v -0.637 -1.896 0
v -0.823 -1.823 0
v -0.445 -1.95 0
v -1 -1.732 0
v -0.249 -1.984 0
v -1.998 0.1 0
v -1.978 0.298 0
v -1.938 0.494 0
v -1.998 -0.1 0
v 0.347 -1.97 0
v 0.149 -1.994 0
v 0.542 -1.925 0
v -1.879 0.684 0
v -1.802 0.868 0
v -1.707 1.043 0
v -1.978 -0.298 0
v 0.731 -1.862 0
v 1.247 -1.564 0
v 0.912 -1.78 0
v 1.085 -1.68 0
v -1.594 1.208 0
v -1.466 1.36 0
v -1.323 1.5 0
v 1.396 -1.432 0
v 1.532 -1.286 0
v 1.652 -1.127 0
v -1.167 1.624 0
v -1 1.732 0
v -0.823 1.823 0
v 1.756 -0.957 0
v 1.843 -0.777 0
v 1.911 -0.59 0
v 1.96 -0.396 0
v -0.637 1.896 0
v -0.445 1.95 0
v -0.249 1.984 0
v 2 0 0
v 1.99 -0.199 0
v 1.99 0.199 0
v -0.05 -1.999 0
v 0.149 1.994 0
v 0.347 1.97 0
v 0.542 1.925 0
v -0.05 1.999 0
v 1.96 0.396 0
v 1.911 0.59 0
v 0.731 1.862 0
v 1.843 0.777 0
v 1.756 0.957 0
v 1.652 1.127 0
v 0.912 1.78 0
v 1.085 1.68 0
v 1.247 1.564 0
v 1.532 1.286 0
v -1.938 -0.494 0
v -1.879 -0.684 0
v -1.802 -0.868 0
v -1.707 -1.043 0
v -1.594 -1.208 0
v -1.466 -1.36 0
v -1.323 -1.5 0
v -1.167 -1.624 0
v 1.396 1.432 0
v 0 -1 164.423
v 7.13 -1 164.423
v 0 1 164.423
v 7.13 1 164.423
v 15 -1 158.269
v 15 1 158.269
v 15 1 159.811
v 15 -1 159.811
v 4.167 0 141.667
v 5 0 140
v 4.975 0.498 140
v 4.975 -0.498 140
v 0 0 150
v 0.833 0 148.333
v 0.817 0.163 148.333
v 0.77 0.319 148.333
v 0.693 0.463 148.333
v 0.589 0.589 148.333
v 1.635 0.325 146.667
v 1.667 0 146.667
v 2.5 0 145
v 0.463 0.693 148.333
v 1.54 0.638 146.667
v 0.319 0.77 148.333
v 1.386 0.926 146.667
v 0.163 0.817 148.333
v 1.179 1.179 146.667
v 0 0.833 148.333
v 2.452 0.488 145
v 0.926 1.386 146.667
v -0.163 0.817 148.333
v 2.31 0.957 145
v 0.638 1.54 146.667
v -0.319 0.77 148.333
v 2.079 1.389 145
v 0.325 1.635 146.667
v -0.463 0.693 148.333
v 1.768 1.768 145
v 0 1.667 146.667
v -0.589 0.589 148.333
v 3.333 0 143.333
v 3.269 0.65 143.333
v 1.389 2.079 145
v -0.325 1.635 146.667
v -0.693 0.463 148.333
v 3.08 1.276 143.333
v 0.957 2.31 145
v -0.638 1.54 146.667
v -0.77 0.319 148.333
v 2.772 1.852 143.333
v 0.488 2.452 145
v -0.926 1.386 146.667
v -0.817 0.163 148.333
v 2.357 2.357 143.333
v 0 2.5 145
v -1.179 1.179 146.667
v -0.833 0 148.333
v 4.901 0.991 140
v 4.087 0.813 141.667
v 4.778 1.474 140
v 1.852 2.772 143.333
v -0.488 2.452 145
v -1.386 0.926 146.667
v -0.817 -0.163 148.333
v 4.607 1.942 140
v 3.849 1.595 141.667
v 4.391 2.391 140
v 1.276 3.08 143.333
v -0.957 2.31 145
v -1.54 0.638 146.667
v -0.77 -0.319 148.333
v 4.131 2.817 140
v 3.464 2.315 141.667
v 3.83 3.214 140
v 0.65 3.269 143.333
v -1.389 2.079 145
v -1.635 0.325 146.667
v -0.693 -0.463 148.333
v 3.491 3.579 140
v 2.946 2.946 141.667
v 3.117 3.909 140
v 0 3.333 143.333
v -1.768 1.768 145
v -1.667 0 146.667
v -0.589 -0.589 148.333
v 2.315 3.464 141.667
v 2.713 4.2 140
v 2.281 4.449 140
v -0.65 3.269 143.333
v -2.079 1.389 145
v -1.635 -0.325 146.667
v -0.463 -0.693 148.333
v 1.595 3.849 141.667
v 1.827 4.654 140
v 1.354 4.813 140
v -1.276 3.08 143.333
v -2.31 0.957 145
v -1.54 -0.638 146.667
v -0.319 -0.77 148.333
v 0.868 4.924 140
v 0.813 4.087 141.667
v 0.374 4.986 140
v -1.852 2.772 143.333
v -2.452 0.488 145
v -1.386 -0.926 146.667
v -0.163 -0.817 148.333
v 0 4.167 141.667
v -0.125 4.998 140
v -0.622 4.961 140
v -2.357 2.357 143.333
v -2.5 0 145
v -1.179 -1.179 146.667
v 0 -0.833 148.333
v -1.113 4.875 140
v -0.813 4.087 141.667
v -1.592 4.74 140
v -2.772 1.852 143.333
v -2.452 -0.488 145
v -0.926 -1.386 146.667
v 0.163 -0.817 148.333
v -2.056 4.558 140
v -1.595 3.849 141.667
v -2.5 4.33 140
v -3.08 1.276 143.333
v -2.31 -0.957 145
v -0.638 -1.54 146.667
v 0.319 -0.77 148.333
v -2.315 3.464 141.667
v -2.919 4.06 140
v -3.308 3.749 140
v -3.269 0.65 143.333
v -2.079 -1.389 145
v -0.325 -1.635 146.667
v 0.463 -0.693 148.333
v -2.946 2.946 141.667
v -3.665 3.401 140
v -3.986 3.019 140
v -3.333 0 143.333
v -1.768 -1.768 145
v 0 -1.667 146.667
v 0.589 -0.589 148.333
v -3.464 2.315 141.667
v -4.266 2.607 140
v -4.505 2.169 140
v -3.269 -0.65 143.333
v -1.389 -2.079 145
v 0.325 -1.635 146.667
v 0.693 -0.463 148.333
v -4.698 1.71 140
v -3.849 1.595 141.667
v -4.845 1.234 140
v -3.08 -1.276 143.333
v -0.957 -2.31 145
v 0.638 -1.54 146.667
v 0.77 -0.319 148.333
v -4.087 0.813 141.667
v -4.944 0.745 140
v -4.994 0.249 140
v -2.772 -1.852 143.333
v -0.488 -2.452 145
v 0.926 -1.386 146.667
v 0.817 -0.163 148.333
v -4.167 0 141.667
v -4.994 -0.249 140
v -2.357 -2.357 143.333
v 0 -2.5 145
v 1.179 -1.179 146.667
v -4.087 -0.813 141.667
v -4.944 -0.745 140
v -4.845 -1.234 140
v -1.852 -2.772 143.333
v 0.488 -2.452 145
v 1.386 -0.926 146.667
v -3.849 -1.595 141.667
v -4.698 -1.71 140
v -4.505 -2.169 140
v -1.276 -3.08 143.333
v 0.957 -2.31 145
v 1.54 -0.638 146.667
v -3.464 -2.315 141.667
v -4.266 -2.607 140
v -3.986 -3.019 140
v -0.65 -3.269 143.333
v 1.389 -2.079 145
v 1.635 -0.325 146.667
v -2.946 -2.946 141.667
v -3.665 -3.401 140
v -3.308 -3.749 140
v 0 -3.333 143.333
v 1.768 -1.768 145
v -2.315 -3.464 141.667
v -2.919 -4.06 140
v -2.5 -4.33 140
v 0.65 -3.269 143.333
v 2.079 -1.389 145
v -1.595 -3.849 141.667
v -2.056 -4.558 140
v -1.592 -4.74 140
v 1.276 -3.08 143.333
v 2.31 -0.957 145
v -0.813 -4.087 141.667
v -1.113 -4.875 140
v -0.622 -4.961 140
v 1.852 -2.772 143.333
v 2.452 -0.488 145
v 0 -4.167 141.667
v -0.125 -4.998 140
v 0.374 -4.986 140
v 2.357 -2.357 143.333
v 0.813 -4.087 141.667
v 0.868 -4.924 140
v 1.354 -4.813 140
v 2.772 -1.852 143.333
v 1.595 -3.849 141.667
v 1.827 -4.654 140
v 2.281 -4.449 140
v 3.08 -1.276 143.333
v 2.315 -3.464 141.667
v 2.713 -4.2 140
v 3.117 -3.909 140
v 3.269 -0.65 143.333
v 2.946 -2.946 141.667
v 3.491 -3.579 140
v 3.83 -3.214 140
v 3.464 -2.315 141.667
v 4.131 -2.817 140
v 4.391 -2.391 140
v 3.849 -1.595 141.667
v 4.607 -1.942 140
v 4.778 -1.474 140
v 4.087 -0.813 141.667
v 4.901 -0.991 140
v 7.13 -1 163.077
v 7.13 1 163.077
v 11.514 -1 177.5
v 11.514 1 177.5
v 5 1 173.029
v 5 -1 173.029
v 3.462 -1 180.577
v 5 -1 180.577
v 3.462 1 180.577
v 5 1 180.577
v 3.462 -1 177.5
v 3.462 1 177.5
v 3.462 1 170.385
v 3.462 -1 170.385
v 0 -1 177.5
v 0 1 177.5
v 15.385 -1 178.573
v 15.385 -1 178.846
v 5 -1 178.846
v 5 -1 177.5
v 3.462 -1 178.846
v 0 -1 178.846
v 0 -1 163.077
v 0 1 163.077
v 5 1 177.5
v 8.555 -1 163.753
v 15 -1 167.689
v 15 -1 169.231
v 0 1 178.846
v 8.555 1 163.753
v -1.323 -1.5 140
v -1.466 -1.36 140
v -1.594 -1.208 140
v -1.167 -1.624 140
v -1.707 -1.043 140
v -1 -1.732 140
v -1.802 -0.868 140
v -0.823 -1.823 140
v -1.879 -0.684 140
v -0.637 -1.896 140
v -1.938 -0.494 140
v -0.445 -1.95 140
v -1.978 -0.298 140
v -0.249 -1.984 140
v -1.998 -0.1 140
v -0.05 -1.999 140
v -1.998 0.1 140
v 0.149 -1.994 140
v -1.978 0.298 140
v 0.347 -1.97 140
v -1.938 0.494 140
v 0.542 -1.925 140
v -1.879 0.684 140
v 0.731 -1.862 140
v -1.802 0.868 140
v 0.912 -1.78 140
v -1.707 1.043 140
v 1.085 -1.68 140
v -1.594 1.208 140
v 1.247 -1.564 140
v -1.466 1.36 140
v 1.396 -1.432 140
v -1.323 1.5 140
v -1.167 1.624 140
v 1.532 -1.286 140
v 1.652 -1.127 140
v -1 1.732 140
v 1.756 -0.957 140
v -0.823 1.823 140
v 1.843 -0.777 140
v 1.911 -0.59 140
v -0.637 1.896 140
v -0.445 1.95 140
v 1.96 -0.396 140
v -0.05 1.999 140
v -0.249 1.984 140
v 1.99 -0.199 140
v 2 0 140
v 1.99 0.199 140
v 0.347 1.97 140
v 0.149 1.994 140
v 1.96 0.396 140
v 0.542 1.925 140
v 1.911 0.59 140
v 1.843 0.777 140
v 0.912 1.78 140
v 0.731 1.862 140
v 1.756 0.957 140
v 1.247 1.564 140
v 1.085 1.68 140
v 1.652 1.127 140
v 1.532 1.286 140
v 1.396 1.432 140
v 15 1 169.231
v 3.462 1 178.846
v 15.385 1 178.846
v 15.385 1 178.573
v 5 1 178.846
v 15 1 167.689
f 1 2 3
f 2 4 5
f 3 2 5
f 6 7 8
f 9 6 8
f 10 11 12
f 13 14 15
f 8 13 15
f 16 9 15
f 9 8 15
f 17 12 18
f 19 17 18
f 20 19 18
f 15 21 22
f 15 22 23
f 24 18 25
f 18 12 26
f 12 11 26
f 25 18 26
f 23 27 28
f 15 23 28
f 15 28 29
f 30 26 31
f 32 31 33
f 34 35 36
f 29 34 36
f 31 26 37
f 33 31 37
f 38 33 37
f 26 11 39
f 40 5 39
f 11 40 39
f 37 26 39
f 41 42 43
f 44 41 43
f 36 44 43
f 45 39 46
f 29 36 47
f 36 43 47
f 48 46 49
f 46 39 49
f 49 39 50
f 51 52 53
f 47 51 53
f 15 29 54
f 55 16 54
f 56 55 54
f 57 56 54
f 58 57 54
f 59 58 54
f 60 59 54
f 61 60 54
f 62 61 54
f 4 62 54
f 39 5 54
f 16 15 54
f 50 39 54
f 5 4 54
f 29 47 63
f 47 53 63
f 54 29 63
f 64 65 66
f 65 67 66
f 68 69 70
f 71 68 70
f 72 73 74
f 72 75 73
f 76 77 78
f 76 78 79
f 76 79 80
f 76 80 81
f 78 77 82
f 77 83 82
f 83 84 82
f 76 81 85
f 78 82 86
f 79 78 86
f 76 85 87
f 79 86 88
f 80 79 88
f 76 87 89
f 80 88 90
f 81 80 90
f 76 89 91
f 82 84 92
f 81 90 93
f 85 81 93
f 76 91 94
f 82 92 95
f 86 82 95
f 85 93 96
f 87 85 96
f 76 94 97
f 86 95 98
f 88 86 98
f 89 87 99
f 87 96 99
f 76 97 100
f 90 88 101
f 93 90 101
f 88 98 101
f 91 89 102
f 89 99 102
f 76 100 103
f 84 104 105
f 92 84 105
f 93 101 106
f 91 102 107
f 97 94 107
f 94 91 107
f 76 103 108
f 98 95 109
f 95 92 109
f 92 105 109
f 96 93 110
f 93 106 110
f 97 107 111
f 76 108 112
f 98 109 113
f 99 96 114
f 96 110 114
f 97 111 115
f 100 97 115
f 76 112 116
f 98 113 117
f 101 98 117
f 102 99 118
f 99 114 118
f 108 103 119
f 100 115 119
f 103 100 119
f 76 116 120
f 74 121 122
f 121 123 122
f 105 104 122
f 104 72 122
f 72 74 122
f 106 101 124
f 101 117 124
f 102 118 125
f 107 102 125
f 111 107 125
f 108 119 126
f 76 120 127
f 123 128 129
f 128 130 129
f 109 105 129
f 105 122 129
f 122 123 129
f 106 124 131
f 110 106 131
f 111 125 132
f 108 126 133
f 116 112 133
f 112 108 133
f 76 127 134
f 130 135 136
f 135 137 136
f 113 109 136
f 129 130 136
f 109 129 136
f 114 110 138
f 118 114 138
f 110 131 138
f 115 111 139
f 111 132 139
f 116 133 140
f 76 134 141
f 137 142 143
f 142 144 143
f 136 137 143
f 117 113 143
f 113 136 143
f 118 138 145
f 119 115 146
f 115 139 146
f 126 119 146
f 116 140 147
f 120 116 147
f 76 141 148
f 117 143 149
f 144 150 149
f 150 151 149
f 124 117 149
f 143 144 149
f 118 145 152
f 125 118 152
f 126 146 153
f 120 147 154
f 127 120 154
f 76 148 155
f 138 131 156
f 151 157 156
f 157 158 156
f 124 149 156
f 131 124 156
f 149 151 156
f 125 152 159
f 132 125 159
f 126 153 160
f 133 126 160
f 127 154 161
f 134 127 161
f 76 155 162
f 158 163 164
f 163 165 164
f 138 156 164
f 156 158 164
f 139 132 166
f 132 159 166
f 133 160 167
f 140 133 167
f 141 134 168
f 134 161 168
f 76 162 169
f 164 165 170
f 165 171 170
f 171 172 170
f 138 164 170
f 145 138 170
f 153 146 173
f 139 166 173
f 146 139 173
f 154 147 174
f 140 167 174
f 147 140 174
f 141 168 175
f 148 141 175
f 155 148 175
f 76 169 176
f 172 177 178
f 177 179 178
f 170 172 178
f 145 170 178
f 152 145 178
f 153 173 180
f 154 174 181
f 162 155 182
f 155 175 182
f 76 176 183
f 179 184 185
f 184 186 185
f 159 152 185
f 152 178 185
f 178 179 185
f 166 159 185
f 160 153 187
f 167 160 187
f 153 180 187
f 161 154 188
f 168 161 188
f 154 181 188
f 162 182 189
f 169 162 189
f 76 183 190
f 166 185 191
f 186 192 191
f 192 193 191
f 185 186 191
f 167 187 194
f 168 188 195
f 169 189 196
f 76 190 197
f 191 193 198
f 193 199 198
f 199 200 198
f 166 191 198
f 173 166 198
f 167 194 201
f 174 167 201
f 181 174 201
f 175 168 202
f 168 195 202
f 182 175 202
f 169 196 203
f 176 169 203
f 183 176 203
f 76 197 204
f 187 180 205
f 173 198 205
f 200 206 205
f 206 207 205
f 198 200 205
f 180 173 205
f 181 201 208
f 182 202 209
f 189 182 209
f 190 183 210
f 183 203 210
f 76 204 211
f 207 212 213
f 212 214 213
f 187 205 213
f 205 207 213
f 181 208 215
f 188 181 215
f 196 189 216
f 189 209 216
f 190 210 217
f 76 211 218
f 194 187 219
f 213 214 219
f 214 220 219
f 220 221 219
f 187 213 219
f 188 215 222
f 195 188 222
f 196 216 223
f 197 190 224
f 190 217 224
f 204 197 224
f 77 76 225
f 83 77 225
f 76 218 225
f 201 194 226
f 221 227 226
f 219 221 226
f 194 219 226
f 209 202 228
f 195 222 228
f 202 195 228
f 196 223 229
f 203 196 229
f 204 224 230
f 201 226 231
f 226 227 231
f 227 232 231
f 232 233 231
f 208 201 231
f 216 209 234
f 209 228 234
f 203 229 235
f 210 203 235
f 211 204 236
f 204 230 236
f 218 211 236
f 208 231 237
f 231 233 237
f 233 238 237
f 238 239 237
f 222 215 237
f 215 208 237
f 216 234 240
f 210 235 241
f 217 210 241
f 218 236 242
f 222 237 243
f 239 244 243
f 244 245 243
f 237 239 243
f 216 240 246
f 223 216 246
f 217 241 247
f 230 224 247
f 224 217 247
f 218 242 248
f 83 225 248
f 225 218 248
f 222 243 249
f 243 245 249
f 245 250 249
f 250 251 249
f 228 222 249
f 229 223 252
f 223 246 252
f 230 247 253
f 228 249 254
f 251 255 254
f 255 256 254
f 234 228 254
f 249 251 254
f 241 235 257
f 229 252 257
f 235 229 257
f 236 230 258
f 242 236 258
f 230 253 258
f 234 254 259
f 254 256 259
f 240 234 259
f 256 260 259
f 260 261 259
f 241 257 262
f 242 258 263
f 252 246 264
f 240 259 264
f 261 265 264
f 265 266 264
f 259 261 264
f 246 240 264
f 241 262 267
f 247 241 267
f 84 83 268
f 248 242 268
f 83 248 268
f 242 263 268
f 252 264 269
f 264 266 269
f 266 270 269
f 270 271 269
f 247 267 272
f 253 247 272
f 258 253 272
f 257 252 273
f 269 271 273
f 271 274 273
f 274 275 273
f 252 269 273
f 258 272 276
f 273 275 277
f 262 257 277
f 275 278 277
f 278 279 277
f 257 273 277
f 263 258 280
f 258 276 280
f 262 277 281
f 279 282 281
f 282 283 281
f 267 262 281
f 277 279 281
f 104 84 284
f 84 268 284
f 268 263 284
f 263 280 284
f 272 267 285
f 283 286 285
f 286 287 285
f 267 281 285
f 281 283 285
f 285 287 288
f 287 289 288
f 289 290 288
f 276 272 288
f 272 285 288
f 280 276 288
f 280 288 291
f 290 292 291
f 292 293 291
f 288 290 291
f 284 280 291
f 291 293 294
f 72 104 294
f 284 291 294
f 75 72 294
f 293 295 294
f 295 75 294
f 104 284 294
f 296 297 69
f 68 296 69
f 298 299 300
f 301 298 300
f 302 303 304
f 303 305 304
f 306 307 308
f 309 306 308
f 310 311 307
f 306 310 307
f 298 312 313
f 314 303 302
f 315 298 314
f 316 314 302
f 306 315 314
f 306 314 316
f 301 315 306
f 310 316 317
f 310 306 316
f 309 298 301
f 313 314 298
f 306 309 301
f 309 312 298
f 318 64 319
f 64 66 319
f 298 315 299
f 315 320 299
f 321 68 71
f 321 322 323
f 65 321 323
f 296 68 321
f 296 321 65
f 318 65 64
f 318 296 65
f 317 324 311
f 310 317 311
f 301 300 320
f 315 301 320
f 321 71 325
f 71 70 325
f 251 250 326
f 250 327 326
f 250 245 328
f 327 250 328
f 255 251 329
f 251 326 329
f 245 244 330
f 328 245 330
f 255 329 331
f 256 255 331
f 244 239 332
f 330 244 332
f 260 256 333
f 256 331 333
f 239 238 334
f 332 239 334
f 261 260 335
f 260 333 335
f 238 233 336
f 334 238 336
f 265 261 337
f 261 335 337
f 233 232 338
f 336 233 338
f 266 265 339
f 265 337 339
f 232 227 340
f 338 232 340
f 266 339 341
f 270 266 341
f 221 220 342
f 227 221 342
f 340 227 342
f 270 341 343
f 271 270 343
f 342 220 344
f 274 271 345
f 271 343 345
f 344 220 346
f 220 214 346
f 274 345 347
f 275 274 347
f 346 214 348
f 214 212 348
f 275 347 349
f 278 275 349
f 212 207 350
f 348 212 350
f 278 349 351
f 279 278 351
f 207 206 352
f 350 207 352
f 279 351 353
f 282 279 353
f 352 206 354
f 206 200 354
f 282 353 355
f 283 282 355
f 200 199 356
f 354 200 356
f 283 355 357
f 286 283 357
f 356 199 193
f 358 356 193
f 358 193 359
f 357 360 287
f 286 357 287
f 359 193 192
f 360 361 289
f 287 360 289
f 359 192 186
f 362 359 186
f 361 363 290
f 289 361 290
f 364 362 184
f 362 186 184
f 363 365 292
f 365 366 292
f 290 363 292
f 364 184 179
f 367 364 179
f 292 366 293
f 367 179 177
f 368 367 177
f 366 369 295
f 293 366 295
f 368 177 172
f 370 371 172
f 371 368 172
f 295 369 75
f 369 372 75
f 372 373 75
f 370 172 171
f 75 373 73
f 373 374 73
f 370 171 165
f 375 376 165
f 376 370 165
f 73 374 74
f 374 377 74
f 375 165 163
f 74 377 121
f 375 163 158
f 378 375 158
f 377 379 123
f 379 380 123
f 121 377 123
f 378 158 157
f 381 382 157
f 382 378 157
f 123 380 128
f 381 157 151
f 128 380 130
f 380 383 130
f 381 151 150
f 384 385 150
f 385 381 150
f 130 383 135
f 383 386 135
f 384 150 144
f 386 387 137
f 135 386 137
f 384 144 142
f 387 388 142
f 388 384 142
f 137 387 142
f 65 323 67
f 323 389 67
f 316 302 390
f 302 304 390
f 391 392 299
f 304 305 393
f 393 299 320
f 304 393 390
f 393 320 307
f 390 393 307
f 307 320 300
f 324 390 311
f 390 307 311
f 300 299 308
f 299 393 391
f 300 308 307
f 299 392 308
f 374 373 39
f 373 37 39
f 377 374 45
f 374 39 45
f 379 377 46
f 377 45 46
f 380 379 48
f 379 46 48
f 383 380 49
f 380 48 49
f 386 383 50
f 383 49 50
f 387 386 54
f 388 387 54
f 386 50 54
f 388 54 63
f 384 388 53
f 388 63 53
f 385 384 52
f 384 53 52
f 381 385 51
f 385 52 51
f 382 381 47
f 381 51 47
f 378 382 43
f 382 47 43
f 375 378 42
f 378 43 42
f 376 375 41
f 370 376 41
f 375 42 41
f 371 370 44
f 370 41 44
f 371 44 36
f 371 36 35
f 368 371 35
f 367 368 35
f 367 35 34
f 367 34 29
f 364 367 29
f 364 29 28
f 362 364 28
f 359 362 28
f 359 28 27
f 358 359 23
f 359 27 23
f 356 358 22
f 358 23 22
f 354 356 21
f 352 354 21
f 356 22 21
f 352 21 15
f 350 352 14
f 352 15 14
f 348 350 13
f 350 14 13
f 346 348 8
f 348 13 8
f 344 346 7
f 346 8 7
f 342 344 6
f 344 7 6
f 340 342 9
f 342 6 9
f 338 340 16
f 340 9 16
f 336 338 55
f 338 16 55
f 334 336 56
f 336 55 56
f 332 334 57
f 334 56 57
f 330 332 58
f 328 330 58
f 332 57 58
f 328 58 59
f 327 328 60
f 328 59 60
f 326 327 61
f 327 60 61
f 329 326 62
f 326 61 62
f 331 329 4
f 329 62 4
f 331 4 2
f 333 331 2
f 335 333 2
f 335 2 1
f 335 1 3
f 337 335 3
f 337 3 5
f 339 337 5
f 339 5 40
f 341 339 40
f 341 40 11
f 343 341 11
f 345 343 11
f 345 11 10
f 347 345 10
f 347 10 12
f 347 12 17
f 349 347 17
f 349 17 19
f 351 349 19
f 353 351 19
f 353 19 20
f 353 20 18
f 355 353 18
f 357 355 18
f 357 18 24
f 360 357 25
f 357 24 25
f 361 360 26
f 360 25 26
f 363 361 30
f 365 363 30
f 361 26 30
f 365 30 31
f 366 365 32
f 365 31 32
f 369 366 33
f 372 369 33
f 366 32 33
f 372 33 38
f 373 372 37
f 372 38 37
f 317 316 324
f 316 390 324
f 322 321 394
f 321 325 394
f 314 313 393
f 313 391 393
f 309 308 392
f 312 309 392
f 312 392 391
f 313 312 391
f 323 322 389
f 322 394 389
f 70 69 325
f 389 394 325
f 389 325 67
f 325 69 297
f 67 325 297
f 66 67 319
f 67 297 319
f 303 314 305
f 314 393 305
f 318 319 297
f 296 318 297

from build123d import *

# Parameters (mm, degrees)
BOSS_EXTRUDE1_DEPTH        = 1
BOSS_EXTRUDE1_DEPTH_BACK   = 1
BOSS_EXTRUDE1_2_DEPTH      = 1
BOSS_EXTRUDE1_2_DEPTH_BACK = 1


with BuildPart() as part:
    # Sketch2 → Revolve1 (revolve)
    with BuildSketch(Plane(origin=(0, 0, 0), x_dir=(1, 0, 0), z_dir=(0, 1, 0))):
        Polygon((0, -150), (5, -140), (2, -140), (2, 0), (0, 0), align=None)
    revolve(axis=Axis((0, 0, -41.949952025), (0, 0, 1)))


with BuildPart() as body_2:
    # Sketch3 → Boss-Extrude1 (new, two sides: drawn at the far end of the back side and taken through both)
    with BuildSketch(Plane(origin=(0, 0, 0), x_dir=(1, 0, 0), z_dir=(0, 1, 0)).offset(-BOSS_EXTRUDE1_DEPTH_BACK)):
        Polygon((15, -158.269230769), (15, -159.810697115), (8.5546875, -163.753004808), (15, -167.689302885), (15, -169.230769231), (7.130408654, -164.423076923), (0, -164.423076923), (0, -163.076923077), (7.130408654, -163.076923077), align=None)
    extrude(amount=BOSS_EXTRUDE1_DEPTH + BOSS_EXTRUDE1_DEPTH_BACK)


with BuildPart() as body_3:
    # Sketch3 → Boss-Extrude1 2 (new, two sides: drawn at the far end of the back side and taken through both)
    with BuildSketch(Plane(origin=(0, 0, 0), x_dir=(1, 0, 0), z_dir=(0, 1, 0)).offset(-BOSS_EXTRUDE1_2_DEPTH_BACK)):
        Polygon((15.384615385, -178.572716346), (15.384615385, -178.846153846), (5, -178.846153846), (5, -180.576923077), (3.461538462, -180.576923077), (3.461538462, -178.846153846), (0, -178.846153846), (0, -177.5), (3.461538462, -177.5), (3.461538462, -170.384615385), align=None)
        Polygon((5, -177.5), (11.514423077, -177.5), (5, -173.028846154), align=None, mode=Mode.SUBTRACT)
    extrude(amount=BOSS_EXTRUDE1_2_DEPTH + BOSS_EXTRUDE1_2_DEPTH_BACK)


solid = Compound([part.part, body_2.part, body_3.part])
